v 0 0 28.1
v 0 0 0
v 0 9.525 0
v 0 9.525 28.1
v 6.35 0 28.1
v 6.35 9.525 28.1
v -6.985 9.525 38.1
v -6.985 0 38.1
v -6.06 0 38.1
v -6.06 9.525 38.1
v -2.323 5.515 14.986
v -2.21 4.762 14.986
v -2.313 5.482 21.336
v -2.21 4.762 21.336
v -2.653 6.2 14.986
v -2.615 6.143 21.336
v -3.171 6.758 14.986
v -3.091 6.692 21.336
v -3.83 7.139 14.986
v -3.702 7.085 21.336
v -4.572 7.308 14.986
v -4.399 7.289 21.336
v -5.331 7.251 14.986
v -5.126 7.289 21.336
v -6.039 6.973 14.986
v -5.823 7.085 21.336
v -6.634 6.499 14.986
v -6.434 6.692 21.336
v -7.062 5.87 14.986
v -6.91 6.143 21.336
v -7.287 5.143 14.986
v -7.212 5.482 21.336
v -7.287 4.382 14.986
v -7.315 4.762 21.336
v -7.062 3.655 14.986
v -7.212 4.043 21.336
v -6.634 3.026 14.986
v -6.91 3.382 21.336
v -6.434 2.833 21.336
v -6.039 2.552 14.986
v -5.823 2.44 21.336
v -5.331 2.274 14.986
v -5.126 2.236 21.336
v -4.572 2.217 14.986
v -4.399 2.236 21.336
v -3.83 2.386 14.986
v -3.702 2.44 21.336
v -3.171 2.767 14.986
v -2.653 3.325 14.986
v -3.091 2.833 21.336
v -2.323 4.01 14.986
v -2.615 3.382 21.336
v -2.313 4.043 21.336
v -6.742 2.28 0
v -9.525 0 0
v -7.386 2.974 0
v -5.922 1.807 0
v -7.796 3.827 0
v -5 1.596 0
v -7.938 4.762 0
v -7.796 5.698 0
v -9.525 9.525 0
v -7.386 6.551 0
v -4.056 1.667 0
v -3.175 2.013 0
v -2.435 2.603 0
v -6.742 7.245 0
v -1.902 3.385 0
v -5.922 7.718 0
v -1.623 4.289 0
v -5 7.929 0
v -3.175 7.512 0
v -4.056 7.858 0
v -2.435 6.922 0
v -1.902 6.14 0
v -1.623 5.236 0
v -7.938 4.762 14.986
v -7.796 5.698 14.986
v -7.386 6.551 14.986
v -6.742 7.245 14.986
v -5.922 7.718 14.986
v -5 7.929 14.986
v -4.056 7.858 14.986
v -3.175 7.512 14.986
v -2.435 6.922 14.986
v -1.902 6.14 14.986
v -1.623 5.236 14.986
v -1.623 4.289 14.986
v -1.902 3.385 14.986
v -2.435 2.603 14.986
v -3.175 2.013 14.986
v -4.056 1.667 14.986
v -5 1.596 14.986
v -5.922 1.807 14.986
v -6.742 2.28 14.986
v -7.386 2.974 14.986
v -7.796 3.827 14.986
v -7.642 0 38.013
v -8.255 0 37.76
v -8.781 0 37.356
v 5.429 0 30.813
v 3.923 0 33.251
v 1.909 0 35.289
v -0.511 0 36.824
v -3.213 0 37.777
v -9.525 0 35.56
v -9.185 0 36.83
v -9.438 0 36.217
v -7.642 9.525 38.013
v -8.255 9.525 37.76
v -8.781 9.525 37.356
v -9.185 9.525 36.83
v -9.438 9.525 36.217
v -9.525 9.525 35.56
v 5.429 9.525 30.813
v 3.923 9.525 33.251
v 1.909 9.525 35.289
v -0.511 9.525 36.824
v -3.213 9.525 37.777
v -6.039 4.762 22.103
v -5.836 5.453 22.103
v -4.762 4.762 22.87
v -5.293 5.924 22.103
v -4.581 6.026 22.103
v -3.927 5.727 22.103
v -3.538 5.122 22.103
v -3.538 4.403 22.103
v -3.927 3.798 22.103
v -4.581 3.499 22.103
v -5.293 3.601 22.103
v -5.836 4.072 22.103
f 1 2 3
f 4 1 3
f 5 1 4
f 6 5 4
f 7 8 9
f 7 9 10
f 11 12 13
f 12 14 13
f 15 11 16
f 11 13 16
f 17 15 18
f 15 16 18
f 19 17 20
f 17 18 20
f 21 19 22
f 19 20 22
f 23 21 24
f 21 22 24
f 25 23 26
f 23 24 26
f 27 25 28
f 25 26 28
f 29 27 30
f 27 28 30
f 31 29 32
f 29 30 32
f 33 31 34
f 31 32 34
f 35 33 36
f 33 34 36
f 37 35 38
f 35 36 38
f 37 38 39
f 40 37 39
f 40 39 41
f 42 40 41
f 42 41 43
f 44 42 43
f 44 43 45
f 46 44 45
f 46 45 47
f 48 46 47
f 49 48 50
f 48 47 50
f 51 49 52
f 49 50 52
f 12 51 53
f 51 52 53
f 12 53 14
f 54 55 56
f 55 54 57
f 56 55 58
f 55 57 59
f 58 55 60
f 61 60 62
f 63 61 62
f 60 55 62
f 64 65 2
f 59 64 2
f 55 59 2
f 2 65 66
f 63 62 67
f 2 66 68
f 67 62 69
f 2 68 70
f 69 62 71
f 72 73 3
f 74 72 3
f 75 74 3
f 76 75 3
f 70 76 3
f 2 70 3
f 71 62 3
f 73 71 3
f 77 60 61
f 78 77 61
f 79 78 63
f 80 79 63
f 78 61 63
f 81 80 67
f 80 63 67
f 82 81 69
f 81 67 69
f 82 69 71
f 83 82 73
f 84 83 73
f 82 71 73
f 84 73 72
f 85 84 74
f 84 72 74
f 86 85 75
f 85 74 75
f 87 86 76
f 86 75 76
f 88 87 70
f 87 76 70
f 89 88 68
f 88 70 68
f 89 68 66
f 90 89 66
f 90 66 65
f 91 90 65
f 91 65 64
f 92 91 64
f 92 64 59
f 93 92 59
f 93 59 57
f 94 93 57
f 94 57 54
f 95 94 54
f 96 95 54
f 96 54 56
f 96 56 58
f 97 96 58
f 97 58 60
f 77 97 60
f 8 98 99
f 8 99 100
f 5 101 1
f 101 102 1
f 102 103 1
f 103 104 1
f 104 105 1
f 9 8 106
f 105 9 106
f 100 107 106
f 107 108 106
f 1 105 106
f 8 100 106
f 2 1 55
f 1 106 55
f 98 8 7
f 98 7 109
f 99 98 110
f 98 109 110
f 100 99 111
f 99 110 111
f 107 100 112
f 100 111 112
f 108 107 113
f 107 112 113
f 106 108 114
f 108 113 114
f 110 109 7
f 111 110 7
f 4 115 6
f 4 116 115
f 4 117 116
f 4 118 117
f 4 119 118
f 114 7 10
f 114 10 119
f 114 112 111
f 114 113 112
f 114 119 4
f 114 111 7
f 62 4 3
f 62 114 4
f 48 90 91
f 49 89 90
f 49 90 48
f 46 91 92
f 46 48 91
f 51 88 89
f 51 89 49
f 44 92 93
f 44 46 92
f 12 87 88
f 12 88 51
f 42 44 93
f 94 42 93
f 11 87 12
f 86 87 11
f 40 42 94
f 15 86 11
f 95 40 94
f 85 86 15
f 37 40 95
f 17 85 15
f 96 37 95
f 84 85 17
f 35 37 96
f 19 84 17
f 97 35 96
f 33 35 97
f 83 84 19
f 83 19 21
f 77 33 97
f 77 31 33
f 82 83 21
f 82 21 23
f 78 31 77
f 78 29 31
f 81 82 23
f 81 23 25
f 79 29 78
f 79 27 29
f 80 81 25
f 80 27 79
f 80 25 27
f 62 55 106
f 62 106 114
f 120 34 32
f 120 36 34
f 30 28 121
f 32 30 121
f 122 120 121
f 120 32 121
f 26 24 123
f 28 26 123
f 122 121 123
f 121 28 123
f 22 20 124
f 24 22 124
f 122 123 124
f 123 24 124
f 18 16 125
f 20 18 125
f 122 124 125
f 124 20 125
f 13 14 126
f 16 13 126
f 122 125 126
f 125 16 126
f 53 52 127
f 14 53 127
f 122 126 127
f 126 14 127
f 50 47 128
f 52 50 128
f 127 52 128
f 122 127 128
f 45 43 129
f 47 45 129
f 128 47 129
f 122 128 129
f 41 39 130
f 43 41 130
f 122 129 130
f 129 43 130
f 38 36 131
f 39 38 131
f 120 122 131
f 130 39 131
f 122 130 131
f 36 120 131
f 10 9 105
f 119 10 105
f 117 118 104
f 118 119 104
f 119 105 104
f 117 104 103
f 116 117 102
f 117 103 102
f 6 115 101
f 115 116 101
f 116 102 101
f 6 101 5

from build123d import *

# Parameters (mm, degrees)
SKETCH1_W                         = 9.525
SKETCH1_H                         = 9.525
EXTRUDE1_DEPTH                    = 38.1
F_1_4_20_TAPPED_HOLE1_D           = 5.1054
F_1_4_20_TAPPED_HOLE1_DEPTH       = 21.336
F_1_4_20_TAPPED_HOLE1_CBORE_D     = 6.35
F_1_4_20_TAPPED_HOLE1_CBORE_DEPTH = 14.986
F_1_4_20_TAPPED_HOLE1_TIP         = 1.533816902
SKETCH9_W                         = 10
SKETCH9_H                         = 9.525
EXTRUDE3_DEPTH                    = 6.35
FILLET2_R                         = 12.7
FILLET3_R                         = 2.54


with BuildPart() as part:
    # Sketch1 → Extrude1 (new body)
    with BuildSketch(Plane.XY):
        with Locations((-4.7625, 4.7625)):
            Rectangle(SKETCH1_W, SKETCH1_H)
    extrude(amount=EXTRUDE1_DEPTH)

    # 1/4-20 Tapped Hole1
    with Locations(Plane(origin=(-4.7625, 4.7625, 0), x_dir=(-1, 0, 0), z_dir=(0, 0, -1))):
        with Locations((0, 0)):
            CounterBoreHole(F_1_4_20_TAPPED_HOLE1_D / 2, F_1_4_20_TAPPED_HOLE1_CBORE_D / 2, F_1_4_20_TAPPED_HOLE1_CBORE_DEPTH, depth=F_1_4_20_TAPPED_HOLE1_DEPTH)
            with Locations((0, 0, -(F_1_4_20_TAPPED_HOLE1_DEPTH + F_1_4_20_TAPPED_HOLE1_TIP / 2))):  # 118° drill point
                Cone(0, F_1_4_20_TAPPED_HOLE1_D / 2, F_1_4_20_TAPPED_HOLE1_TIP, mode=Mode.SUBTRACT)

    # Sketch9 → Extrude3 (add)
    with BuildSketch(Plane(origin=(0, 0, 0), x_dir=(0, 0, -1), z_dir=(1, 0, 0))):
        with Locations((-33.1, 4.7625)):
            Rectangle(SKETCH9_W, SKETCH9_H)
    extrude(amount=EXTRUDE3_DEPTH)

    # Fillet2
    # the kernel refuses this fillet: 12.7 mm, written as the material it takes off along each edge
    with BuildSketch(Plane(origin=(6.35, -31.024184115, 38.1), x_dir=(-1, 0, 0), z_dir=(0, 1, 0))) as fillet2_piece_1:
        with BuildLine():
            CenterArc((12.409673646, -12.7), FILLET2_R, 90, 77.725329785)
            Line((0, -10), (-0.248193473, -9.946))
            ThreePointArc((-0.248193473, -9.946), (-0.254, -5), (-0.254, 0))
            Line((-0.254, 0), (0, 0.254))
            Line((0, 0.254), (12.409673646, 0.254))
            Line((12.409673646, 0.254), (12.409673646, 0))
        make_face()
    extrude(amount=71.57336823, mode=Mode.SUBTRACT)

    # Fillet3
    fillet3_edges = [part.edges().sort_by_distance(p)[0] for p in [
        (-9.525, 4.7625, 38.1),
    ]]
    fillet(fillet3_edges, radius=FILLET3_R)


solid = part.part
